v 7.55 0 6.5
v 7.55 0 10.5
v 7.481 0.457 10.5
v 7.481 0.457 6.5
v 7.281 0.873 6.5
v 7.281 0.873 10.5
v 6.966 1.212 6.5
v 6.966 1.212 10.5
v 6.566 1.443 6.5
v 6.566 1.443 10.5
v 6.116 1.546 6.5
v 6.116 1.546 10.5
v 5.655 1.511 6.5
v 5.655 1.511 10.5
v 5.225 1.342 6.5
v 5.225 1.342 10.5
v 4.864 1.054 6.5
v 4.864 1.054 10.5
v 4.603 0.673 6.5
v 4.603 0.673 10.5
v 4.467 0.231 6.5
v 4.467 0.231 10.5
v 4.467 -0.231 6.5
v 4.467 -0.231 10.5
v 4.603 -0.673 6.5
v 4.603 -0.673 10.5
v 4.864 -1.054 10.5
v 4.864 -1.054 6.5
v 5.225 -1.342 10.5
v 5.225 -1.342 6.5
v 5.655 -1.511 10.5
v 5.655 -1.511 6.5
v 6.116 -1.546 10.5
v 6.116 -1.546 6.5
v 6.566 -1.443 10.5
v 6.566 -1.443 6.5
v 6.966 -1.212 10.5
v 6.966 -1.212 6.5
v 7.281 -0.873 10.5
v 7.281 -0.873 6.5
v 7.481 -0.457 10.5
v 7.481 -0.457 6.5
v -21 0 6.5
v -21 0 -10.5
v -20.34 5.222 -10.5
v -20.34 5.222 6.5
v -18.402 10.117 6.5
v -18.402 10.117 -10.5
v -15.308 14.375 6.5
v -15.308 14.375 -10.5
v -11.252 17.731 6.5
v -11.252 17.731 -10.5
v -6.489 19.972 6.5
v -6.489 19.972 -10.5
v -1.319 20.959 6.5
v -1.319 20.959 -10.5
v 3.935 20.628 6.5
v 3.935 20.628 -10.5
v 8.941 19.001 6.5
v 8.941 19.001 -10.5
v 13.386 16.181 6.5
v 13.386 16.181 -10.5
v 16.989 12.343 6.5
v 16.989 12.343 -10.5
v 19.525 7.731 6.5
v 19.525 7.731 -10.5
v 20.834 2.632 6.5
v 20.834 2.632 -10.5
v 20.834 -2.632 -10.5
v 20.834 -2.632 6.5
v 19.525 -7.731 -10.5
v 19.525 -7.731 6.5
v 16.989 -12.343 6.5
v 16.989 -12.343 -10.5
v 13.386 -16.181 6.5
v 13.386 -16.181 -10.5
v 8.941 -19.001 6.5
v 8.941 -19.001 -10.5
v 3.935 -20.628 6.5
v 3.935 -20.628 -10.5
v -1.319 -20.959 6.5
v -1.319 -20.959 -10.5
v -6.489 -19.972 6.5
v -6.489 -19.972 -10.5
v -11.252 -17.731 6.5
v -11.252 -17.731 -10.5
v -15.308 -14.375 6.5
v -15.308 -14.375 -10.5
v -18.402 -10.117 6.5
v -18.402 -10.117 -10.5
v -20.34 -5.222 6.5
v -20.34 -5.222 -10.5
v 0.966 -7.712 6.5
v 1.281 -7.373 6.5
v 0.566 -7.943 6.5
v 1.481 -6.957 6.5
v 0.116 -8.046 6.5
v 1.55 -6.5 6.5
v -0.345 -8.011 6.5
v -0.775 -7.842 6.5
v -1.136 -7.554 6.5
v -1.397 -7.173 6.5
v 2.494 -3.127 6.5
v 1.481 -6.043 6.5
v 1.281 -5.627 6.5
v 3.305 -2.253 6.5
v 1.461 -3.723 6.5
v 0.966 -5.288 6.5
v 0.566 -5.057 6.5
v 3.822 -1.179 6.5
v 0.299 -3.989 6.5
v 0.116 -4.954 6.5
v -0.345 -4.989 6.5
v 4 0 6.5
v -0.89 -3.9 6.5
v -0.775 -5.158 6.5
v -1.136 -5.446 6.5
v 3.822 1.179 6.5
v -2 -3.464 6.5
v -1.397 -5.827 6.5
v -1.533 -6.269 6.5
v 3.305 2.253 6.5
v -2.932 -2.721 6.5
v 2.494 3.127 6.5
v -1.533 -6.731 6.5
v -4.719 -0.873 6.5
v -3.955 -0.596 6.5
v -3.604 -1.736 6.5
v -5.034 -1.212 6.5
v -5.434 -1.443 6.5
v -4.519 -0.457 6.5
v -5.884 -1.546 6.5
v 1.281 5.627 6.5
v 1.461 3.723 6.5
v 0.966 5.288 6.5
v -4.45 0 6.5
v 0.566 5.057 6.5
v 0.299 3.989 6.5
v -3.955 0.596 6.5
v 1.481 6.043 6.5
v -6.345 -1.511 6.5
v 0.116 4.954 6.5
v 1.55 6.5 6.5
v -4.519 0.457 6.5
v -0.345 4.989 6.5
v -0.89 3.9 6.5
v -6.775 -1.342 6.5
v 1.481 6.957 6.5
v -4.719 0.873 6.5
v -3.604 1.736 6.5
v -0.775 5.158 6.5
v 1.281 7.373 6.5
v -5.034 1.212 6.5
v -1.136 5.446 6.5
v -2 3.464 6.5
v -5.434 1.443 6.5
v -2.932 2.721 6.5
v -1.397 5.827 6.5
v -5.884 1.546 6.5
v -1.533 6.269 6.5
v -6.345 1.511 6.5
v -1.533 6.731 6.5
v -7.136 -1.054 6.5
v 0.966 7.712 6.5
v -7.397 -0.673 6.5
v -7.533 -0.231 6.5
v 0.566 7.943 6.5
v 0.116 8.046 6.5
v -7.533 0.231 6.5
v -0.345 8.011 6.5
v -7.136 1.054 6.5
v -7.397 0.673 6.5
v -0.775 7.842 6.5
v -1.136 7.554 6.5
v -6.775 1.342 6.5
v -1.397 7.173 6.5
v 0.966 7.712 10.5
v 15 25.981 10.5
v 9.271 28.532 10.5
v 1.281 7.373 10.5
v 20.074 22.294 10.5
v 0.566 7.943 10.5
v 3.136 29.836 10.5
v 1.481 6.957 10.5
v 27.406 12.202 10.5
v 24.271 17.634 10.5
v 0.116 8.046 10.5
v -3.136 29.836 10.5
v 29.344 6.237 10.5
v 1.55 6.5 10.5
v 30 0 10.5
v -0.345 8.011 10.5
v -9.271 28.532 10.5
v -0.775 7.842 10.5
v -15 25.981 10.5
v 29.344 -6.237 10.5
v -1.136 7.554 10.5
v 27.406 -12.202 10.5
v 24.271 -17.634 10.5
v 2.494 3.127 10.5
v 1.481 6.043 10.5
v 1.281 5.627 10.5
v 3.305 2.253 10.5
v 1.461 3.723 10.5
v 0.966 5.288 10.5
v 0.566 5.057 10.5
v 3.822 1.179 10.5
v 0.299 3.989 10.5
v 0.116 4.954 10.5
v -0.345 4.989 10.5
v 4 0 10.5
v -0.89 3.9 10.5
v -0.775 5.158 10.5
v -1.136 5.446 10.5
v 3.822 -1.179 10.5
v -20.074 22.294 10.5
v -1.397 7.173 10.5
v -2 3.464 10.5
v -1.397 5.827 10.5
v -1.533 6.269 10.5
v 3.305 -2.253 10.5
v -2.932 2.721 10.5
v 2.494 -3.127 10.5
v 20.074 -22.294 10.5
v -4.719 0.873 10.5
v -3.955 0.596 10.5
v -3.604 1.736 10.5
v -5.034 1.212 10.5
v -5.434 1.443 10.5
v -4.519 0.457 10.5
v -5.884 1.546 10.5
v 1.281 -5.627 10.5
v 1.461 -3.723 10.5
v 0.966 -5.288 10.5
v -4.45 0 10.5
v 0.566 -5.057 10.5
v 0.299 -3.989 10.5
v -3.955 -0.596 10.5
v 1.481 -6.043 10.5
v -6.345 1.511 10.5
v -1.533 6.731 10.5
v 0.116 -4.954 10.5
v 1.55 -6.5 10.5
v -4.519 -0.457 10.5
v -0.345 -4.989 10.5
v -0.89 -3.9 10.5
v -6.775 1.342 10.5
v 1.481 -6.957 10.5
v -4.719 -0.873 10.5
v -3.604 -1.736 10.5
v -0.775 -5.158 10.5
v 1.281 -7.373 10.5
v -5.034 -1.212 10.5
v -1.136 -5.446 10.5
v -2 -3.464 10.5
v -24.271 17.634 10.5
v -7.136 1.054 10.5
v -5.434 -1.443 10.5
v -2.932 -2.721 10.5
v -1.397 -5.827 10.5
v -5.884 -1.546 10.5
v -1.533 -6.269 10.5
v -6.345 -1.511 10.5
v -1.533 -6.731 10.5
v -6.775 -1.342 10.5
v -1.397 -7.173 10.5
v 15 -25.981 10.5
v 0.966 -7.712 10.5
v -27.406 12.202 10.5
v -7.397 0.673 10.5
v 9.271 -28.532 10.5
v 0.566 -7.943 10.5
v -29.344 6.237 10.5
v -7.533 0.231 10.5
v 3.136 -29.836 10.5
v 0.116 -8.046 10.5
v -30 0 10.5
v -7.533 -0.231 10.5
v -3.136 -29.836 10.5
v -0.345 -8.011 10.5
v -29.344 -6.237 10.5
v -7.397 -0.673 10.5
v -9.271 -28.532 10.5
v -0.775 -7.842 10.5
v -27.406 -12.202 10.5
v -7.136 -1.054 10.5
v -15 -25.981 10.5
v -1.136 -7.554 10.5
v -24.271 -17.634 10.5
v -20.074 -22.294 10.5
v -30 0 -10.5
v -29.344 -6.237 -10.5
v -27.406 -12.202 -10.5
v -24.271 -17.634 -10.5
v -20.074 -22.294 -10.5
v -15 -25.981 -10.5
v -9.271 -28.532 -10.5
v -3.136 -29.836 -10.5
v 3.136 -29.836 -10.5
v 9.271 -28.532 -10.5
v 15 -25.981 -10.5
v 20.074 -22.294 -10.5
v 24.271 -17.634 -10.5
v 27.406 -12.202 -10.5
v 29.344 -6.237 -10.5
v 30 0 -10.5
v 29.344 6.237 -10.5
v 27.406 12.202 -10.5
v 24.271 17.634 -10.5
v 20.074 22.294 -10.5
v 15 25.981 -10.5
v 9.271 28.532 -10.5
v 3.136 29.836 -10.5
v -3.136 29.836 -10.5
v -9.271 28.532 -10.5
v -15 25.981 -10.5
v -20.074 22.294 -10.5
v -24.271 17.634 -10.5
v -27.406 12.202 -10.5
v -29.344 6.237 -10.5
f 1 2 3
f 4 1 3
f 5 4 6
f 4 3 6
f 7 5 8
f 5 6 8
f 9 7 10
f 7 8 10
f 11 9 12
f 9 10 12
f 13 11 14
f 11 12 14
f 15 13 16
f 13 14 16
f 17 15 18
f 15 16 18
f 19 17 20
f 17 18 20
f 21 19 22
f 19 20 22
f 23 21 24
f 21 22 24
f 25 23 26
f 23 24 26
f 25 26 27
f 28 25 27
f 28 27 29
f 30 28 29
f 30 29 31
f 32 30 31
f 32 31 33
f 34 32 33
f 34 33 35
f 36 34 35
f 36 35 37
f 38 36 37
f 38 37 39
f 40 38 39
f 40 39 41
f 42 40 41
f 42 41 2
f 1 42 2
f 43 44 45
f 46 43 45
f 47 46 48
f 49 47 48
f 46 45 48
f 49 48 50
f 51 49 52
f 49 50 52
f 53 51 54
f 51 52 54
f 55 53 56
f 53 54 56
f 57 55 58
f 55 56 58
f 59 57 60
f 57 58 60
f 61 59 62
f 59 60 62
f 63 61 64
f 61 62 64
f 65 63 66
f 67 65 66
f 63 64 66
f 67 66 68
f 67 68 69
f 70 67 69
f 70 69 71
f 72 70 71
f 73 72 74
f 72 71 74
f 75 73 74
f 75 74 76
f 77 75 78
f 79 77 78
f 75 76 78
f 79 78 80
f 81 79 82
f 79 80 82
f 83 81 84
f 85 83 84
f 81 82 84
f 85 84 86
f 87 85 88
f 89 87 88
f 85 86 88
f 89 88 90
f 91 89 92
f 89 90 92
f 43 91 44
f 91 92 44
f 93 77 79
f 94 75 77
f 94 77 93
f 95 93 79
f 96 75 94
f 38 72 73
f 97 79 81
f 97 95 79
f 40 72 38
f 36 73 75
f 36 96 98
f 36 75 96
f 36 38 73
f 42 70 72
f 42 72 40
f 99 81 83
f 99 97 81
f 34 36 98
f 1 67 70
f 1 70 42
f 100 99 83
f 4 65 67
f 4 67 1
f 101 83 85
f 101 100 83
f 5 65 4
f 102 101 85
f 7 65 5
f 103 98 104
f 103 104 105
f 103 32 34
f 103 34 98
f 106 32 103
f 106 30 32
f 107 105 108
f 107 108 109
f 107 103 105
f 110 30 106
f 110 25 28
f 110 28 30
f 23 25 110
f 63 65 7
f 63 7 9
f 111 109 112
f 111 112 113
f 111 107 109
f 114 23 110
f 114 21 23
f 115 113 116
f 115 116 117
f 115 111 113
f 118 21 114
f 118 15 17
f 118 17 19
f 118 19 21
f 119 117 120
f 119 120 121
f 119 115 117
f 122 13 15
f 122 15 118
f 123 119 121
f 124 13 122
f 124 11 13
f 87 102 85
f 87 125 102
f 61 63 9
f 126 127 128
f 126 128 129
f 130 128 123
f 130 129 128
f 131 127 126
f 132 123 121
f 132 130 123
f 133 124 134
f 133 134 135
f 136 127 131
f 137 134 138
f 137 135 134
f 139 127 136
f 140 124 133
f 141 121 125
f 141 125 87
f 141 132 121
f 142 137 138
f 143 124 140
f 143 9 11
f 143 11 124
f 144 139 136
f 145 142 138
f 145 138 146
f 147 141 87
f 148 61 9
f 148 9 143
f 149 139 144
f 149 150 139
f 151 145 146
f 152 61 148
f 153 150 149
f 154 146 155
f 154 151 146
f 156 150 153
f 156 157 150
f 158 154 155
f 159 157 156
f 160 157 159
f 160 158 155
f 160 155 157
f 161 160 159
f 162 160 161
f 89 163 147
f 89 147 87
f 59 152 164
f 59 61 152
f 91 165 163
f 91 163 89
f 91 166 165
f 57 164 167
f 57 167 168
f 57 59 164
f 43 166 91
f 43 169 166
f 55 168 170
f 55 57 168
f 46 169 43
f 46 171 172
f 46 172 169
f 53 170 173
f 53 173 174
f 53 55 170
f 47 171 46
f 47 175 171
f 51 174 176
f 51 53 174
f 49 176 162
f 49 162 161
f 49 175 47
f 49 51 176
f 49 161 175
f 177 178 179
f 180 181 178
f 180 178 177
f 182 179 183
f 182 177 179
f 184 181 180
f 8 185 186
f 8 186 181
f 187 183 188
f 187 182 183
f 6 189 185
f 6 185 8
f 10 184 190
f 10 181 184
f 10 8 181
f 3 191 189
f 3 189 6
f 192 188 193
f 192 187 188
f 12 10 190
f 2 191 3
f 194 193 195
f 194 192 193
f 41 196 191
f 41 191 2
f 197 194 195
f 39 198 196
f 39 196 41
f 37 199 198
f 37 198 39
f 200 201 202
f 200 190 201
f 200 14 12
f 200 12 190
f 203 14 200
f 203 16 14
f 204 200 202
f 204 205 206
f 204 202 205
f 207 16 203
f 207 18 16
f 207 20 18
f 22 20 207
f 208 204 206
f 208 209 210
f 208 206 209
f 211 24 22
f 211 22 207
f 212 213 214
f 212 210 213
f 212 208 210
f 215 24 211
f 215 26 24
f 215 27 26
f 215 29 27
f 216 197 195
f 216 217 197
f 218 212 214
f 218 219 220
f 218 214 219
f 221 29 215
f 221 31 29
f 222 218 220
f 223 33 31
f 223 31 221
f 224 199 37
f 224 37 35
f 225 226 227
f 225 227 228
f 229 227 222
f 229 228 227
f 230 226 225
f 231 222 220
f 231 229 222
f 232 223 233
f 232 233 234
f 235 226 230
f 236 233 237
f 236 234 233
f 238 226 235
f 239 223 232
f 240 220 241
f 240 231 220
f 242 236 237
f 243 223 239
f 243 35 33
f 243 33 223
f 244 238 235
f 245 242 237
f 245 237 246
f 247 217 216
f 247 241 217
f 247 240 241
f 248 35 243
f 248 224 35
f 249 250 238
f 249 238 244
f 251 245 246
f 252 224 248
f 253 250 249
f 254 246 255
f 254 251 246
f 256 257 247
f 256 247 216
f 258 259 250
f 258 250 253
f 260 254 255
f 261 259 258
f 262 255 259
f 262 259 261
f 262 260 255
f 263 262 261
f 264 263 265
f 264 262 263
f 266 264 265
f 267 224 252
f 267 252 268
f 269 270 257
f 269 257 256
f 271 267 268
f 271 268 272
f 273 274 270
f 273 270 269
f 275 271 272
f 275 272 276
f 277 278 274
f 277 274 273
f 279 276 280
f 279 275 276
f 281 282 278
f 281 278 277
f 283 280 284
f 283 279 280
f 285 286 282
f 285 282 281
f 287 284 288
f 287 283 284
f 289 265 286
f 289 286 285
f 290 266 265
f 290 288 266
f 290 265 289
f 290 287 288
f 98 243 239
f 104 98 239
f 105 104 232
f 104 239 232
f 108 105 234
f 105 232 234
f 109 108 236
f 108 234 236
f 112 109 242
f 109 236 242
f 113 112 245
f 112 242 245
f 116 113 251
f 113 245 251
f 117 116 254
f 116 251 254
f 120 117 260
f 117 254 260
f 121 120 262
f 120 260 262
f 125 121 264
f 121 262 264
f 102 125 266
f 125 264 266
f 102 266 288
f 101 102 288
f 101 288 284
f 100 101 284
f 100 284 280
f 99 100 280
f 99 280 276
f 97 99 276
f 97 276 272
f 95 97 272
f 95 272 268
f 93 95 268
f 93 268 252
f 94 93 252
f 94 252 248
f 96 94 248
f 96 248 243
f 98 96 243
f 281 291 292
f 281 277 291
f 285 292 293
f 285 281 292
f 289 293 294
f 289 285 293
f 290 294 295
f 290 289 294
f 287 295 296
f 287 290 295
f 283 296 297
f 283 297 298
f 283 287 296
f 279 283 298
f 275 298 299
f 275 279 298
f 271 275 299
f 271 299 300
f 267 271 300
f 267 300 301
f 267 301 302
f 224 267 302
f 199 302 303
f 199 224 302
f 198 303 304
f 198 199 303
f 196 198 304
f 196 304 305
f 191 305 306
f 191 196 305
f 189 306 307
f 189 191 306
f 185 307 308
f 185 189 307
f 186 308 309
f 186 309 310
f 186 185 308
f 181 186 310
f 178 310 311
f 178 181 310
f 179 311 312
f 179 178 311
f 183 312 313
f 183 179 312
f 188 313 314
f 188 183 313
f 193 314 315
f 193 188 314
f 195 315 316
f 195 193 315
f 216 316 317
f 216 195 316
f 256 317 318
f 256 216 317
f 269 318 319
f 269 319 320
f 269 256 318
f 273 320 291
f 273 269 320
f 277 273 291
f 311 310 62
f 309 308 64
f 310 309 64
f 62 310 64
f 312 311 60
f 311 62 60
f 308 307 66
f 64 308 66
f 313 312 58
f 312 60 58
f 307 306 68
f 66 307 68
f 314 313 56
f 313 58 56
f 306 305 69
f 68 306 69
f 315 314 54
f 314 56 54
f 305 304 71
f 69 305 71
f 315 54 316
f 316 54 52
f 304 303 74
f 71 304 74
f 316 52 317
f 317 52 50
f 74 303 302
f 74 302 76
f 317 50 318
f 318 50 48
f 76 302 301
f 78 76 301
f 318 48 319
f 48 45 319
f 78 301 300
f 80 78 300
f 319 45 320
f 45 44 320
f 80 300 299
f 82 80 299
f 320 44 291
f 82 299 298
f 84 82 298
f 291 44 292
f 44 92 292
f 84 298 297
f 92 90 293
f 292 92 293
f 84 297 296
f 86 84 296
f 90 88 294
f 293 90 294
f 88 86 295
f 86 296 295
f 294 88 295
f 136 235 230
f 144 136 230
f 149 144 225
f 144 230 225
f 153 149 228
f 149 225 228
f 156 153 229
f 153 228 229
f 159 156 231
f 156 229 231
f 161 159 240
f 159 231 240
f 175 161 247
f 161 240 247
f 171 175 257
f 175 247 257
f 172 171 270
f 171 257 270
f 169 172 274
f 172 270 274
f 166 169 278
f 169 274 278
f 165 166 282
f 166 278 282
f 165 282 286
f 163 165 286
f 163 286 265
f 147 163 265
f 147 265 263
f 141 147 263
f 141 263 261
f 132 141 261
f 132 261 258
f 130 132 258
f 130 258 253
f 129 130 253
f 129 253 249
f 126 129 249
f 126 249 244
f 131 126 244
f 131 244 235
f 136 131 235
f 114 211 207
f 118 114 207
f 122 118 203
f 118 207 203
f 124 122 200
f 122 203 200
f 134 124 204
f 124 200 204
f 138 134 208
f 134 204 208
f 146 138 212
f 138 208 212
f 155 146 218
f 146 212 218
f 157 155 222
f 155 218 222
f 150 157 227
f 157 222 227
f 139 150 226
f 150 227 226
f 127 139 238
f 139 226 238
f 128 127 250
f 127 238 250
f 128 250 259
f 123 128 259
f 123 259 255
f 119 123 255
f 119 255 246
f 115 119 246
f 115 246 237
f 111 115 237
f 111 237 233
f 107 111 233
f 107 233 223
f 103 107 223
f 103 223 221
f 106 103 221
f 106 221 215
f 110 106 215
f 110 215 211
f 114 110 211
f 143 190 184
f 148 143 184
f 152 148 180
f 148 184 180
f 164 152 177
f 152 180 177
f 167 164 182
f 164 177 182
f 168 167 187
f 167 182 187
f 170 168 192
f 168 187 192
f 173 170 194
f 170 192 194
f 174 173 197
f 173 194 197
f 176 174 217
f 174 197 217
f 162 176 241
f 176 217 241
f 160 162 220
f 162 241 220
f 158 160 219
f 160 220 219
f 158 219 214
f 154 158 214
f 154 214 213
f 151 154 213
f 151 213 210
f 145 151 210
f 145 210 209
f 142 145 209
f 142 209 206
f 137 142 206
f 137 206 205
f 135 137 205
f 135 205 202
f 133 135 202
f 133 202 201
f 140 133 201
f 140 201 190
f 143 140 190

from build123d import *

# Parameters (mm, degrees)
SKETCH1_R           = 30
BOSS_EXTRUDE1_DEPTH = 10.5
SKETCH2_R           = 1.55
SKETCH2_R_2         = 4
CUT_EXTRUDE1_DEPTH  = 10
SKETCH3_R           = 21
CUT_EXTRUDE2_DEPTH  = 17


with BuildPart() as part:
    # Sketch1 → Boss-Extrude1 (new, symmetric)
    with BuildSketch(Plane.XY):
        with Locations(Location((0, 0, 0), (0, 0, 180))):
            Circle(SKETCH1_R)
    extrude(amount=BOSS_EXTRUDE1_DEPTH, both=True)

    # Sketch2 → Cut-Extrude1 (cut)
    with BuildSketch(Plane.XY.offset(10.5)):
        with Locations((-6, 0)):
            Circle(SKETCH2_R)
        with Locations((0, 6.5)):
            Circle(SKETCH2_R)
        with Locations((6, 0)):
            Circle(SKETCH2_R)
        with Locations((0, -6.5)):
            Circle(SKETCH2_R)
        Circle(SKETCH2_R_2)
    extrude(amount=-CUT_EXTRUDE1_DEPTH, mode=Mode.SUBTRACT)

    # Sketch3 → Cut-Extrude2 (cut)
    with BuildSketch(Plane(origin=(0, 0, -10.5), x_dir=(-1, 0, 0), z_dir=(0, 0, -1))):
        Circle(SKETCH3_R)
    extrude(amount=-CUT_EXTRUDE2_DEPTH, mode=Mode.SUBTRACT)


solid = part.part
